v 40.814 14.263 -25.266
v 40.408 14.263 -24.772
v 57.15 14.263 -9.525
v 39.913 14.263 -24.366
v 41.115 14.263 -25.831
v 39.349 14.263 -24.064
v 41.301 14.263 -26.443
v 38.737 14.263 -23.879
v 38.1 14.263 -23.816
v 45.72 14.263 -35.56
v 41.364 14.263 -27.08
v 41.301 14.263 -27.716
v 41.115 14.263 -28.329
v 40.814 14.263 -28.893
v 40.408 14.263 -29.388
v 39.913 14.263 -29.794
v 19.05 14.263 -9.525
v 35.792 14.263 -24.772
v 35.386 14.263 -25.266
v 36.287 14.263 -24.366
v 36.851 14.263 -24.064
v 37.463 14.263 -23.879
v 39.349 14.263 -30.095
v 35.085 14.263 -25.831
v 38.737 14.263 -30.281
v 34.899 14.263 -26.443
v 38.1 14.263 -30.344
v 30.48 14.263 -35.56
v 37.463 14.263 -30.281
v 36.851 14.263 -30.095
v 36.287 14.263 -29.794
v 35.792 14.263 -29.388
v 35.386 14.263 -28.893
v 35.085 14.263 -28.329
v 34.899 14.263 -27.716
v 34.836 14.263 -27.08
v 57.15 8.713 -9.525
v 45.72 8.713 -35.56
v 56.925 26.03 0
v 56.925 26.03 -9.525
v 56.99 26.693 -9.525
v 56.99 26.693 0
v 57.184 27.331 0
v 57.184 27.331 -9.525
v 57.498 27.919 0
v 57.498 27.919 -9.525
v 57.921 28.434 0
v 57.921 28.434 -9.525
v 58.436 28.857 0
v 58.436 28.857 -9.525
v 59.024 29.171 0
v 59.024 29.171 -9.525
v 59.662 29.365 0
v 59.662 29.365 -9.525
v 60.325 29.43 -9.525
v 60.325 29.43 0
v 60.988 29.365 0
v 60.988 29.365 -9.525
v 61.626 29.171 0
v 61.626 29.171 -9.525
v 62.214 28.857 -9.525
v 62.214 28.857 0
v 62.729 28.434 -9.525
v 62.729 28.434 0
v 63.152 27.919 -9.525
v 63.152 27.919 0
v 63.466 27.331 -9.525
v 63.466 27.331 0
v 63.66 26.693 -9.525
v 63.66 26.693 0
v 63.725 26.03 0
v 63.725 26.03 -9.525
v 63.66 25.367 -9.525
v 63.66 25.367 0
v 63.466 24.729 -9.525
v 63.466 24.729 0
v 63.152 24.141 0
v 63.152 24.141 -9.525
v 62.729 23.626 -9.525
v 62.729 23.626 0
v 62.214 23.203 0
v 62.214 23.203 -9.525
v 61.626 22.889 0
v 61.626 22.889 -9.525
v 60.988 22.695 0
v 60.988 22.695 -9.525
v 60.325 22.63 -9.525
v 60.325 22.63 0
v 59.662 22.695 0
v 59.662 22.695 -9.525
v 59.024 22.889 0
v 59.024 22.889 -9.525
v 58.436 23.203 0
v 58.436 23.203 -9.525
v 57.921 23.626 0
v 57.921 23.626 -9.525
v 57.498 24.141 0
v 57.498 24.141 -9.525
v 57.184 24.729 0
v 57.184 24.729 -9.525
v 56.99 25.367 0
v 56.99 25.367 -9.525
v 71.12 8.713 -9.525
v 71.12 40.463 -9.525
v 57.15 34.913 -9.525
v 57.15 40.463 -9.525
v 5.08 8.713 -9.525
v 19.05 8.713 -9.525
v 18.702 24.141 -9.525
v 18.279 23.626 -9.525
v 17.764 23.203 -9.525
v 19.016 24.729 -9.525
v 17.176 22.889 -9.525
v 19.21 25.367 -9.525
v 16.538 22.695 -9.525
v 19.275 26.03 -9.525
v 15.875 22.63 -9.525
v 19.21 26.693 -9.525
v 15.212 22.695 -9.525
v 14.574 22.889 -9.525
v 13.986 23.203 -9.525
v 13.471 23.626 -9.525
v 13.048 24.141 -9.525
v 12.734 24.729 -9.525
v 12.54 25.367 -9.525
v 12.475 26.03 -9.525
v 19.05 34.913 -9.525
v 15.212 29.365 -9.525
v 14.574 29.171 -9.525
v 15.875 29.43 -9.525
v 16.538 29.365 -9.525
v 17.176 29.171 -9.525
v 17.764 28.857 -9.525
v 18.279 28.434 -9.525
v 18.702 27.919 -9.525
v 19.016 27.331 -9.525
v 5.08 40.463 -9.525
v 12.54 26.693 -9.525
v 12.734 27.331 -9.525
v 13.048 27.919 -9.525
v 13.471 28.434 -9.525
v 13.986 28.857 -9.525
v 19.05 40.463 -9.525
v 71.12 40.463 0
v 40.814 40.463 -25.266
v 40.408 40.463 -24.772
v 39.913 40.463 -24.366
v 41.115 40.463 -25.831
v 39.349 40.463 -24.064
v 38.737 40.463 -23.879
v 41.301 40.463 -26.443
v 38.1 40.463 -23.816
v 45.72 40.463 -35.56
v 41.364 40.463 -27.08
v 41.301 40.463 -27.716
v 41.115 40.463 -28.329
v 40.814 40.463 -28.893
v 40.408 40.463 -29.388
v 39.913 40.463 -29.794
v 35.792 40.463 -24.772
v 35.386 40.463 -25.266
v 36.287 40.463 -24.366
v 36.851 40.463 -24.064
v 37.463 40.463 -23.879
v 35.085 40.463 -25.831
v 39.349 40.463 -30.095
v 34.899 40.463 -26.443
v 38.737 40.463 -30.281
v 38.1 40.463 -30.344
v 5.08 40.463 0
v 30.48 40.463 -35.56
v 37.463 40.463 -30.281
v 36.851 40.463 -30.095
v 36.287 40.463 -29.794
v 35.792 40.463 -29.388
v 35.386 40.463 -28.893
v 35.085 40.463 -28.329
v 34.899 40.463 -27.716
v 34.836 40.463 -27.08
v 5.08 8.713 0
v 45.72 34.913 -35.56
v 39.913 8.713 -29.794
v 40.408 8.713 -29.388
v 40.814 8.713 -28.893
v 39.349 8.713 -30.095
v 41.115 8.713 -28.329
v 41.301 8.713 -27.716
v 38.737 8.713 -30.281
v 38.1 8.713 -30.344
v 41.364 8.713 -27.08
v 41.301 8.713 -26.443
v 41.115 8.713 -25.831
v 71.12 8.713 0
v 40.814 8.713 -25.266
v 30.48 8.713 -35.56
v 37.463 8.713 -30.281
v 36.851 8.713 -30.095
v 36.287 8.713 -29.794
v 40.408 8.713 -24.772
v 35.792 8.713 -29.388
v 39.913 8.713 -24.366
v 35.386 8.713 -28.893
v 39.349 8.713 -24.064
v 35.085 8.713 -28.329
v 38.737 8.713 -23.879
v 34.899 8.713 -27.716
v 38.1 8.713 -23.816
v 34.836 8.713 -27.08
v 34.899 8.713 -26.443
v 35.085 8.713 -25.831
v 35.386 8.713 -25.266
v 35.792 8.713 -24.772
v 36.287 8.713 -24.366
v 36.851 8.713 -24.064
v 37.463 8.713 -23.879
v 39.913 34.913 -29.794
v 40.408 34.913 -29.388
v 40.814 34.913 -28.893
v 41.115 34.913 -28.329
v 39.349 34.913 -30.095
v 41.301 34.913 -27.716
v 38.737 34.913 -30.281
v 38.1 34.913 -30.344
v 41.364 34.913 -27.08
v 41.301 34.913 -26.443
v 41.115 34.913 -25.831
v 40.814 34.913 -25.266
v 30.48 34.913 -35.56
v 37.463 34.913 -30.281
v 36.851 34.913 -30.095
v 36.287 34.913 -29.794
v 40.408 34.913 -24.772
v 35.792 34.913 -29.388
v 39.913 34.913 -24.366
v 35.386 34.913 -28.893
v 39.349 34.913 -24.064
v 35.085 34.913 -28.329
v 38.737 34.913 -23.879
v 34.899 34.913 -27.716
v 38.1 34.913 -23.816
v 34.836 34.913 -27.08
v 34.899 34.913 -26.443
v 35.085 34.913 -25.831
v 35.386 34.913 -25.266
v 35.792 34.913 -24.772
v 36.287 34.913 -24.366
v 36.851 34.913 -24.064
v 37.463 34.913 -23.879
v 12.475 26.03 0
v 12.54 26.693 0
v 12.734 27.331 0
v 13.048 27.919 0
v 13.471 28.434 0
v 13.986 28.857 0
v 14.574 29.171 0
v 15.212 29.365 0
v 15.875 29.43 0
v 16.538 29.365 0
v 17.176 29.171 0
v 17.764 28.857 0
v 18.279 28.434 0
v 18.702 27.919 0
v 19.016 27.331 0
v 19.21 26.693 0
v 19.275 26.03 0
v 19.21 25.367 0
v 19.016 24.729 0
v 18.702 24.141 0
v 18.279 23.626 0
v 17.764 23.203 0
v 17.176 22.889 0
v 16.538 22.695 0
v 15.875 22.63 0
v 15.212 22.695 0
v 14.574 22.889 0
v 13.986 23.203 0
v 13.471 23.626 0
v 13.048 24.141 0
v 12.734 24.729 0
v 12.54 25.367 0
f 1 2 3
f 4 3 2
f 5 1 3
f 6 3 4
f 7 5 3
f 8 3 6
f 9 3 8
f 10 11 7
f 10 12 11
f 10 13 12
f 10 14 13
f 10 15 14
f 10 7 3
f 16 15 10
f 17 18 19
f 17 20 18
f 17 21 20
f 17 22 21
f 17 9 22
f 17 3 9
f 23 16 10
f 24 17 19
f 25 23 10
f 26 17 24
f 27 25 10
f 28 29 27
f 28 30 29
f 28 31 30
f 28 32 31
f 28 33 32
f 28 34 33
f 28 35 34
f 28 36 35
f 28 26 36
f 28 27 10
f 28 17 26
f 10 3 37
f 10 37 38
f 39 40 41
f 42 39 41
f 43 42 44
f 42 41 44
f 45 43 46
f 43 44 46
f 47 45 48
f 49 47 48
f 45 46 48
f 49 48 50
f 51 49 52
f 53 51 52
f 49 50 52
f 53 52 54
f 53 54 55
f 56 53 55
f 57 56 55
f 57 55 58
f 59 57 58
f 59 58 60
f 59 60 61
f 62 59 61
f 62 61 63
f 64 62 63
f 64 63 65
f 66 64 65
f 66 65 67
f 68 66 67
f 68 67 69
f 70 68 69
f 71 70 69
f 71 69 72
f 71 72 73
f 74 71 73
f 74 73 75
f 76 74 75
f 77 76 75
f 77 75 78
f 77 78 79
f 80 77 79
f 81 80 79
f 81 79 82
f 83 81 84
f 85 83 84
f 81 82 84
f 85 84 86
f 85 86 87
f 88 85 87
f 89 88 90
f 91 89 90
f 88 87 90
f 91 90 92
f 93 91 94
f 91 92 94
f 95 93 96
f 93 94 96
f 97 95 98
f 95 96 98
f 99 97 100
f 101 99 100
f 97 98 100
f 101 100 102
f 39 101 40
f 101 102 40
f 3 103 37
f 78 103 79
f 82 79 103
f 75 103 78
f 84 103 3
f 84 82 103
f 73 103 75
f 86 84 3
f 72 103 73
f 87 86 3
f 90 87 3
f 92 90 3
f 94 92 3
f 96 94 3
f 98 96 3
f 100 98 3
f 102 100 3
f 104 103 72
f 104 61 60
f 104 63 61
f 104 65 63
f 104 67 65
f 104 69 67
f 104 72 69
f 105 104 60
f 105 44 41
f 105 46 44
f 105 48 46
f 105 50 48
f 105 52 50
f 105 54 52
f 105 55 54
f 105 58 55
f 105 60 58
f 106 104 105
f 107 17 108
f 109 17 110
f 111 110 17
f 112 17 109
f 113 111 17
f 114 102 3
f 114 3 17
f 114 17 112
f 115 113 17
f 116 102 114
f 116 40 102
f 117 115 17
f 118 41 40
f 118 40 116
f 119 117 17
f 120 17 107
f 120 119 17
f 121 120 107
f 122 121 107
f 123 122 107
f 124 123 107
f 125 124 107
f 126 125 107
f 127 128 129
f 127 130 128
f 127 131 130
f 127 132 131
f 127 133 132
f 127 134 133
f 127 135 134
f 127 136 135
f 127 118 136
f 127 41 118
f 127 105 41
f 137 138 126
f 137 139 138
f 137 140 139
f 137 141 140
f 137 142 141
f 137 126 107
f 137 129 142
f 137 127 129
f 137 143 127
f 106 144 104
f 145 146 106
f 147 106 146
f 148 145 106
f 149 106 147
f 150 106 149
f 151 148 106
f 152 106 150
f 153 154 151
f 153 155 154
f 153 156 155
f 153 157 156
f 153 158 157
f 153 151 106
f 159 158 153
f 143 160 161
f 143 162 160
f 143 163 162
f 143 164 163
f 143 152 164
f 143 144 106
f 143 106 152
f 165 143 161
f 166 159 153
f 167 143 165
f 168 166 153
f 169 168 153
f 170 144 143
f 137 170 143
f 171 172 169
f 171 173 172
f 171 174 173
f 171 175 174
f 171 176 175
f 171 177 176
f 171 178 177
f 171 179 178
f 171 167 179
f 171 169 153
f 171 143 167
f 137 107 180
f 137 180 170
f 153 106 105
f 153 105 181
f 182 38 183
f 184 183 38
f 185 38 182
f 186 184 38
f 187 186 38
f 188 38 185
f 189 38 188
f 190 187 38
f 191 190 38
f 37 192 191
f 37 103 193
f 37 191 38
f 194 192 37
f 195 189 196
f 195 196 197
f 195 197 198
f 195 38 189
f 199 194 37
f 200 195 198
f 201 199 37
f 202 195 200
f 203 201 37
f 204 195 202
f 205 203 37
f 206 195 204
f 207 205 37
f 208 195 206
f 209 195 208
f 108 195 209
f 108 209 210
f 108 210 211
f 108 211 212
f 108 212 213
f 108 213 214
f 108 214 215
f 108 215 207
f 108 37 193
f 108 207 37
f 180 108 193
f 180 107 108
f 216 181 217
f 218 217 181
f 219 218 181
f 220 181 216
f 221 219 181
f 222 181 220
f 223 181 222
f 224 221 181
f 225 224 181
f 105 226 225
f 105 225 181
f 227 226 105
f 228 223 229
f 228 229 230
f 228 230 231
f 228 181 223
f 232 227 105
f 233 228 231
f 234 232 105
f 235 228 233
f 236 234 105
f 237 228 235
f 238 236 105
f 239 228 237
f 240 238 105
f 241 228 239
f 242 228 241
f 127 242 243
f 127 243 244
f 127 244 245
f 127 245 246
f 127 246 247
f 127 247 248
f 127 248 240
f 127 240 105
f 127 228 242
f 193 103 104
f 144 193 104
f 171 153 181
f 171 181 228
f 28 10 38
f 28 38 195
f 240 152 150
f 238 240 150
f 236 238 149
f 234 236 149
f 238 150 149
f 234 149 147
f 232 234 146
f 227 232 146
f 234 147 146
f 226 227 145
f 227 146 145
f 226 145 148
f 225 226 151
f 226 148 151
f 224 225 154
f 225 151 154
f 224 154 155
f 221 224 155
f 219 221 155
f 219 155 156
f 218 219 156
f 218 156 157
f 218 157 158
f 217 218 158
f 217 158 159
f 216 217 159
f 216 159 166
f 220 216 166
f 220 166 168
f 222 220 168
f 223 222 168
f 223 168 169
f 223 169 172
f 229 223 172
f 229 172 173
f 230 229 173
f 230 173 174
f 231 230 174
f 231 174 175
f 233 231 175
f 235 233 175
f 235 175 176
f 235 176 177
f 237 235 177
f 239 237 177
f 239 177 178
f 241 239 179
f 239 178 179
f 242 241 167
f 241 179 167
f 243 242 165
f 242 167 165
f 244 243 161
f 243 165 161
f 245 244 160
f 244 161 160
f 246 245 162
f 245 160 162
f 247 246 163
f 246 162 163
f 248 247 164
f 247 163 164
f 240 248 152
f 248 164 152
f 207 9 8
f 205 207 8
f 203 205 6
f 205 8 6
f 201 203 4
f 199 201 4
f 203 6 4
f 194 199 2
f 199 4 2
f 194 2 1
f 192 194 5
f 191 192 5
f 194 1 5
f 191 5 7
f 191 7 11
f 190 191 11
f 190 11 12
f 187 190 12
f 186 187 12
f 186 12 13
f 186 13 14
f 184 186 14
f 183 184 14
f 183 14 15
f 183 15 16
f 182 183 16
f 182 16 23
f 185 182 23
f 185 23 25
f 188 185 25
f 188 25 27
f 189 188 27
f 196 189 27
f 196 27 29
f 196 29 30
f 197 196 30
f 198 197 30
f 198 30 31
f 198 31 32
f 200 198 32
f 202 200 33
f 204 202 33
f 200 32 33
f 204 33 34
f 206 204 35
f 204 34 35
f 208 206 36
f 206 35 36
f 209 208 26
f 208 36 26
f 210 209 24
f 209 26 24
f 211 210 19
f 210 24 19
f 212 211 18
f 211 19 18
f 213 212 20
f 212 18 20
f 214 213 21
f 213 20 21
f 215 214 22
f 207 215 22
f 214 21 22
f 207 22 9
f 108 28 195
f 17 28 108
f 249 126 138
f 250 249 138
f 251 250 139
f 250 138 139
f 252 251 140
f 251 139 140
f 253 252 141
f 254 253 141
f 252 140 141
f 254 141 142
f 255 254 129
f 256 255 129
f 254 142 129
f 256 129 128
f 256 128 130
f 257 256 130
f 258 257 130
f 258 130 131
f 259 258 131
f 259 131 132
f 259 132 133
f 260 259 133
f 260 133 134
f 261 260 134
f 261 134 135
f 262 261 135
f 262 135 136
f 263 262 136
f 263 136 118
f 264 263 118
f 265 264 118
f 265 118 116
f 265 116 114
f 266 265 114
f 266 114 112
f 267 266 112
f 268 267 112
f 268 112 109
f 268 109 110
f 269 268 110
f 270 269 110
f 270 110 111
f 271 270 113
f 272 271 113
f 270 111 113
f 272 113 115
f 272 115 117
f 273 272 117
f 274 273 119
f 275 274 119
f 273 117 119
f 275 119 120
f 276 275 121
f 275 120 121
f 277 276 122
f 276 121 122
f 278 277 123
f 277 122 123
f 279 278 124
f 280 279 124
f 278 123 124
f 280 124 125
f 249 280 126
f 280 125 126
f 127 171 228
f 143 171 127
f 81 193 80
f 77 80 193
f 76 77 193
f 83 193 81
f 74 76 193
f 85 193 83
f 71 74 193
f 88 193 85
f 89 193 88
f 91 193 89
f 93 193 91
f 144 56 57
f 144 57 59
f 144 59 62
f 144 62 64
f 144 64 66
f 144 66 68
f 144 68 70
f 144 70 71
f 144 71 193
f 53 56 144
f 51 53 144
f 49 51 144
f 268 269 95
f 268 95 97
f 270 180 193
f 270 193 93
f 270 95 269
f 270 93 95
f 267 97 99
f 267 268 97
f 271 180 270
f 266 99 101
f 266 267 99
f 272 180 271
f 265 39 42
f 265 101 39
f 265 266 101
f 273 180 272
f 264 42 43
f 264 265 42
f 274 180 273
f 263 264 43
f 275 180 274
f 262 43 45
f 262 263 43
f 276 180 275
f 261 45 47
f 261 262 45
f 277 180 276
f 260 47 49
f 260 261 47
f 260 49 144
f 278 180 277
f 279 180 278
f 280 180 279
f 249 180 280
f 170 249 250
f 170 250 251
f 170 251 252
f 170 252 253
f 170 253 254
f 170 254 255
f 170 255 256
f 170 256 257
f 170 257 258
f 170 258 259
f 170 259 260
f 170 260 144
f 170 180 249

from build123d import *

# Parameters (mm, degrees)
BOSS_EXTRUDE1_DEPTH = 76.2
SKETCH2_R           = 3.4
CUT_EXTRUDE1_DEPTH  = 9.525
CUT_EXTRUDE2_REACH  = 93.635
SKETCH3_R           = 3.2639
SKETCH4_W           = 5.08
SKETCH4_H           = 31.75
CUT_EXTRUDE3_DEPTH  = 9.525


with BuildPart() as part:
    # Sketch1 → Boss-Extrude1 (new body)
    with BuildSketch(Plane(origin=(0, 0, 0), x_dir=(0, 0, -1), z_dir=(1, 0, 0))):
        Polygon((0, 8.712610854), (0, 40.462610854), (39.779713659, 40.462610854), (39.779713659, 34.912710854), (9.525, 34.912710854), (9.525, 14.262510854), (39.779713659, 14.262510854), (39.779713659, 8.712610854), align=None)
    extrude(amount=BOSS_EXTRUDE1_DEPTH)

    # Sketch2 → Cut-Extrude1 (cut)
    with BuildSketch(Plane(origin=(0, 0, -9.525), x_dir=(-1, 0, 0), z_dir=(0, 0, -1))):
        with Locations((-60.325, 26.02985118)):
            Circle(SKETCH2_R)
        with Locations((-15.875, 26.02985118)):
            Circle(SKETCH2_R)
    extrude(amount=-CUT_EXTRUDE1_DEPTH, mode=Mode.SUBTRACT)

    # Cut-Extrude2: up to this face of the body (flat: up to its plane)
    cut_extrude2_end = Plane(part.part.faces().sort_by_distance((38.1, 8.712610854, -19.889856829))[0])
    # Sketch3 → Cut-Extrude2 (cut, up to the picked face)
    with BuildSketch(Plane(origin=(0, 40.462610854, 0), x_dir=(1, 0, 0), z_dir=(0, 1, 0)), mode=Mode.PRIVATE) as cut_extrude2_sk1:
        with Locations(Location((38.1, 27.079713659, 0), (0, 0, 270))):
            Circle(SKETCH3_R)
    cut_extrude2_tool1 = split(extrude(cut_extrude2_sk1.sketch, amount=-CUT_EXTRUDE2_REACH, mode=Mode.PRIVATE), bisect_by=cut_extrude2_end, keep=Keep.BOTH, mode=Mode.PRIVATE)
    # Sketch3 → Cut-Extrude2 (cut, up to the picked face)
    with BuildSketch(Plane(origin=(0, 40.462610854, 0), x_dir=(1, 0, 0), z_dir=(0, 1, 0)), mode=Mode.PRIVATE) as cut_extrude2_sk2:
        Polygon((30.48, 35.56), (19.05, 9.525), (0, 9.525), (0, 39.779713659), (76.2, 39.779713659), (76.2, 9.525), (57.15, 9.525), (45.72, 35.56), align=None)
    cut_extrude2_tool2 = split(extrude(cut_extrude2_sk2.sketch, amount=-CUT_EXTRUDE2_REACH, mode=Mode.PRIVATE), bisect_by=cut_extrude2_end, keep=Keep.BOTH, mode=Mode.PRIVATE)
    add(cut_extrude2_tool1.solids().sort_by(Axis((38.1, 40.462611, -27.079714), (0, -1, 0)))[0], mode=Mode.SUBTRACT)
    add(cut_extrude2_tool2.solids().sort_by(Axis((24.014295, 40.462611, -22.872078), (0, -1, 0)))[0], mode=Mode.SUBTRACT)

    # Sketch4 → Cut-Extrude3 (cut)
    with BuildSketch(Plane(origin=(0, 0, -9.525), x_dir=(-1, 0, 0), z_dir=(0, 0, -1))):
        with Locations((-2.54, 24.587610854)):
            Rectangle(SKETCH4_W, SKETCH4_H)
        with Locations((-73.66, 24.587610854)):
            Rectangle(SKETCH4_W, SKETCH4_H)
    extrude(amount=-CUT_EXTRUDE3_DEPTH, mode=Mode.SUBTRACT)


solid = part.part
